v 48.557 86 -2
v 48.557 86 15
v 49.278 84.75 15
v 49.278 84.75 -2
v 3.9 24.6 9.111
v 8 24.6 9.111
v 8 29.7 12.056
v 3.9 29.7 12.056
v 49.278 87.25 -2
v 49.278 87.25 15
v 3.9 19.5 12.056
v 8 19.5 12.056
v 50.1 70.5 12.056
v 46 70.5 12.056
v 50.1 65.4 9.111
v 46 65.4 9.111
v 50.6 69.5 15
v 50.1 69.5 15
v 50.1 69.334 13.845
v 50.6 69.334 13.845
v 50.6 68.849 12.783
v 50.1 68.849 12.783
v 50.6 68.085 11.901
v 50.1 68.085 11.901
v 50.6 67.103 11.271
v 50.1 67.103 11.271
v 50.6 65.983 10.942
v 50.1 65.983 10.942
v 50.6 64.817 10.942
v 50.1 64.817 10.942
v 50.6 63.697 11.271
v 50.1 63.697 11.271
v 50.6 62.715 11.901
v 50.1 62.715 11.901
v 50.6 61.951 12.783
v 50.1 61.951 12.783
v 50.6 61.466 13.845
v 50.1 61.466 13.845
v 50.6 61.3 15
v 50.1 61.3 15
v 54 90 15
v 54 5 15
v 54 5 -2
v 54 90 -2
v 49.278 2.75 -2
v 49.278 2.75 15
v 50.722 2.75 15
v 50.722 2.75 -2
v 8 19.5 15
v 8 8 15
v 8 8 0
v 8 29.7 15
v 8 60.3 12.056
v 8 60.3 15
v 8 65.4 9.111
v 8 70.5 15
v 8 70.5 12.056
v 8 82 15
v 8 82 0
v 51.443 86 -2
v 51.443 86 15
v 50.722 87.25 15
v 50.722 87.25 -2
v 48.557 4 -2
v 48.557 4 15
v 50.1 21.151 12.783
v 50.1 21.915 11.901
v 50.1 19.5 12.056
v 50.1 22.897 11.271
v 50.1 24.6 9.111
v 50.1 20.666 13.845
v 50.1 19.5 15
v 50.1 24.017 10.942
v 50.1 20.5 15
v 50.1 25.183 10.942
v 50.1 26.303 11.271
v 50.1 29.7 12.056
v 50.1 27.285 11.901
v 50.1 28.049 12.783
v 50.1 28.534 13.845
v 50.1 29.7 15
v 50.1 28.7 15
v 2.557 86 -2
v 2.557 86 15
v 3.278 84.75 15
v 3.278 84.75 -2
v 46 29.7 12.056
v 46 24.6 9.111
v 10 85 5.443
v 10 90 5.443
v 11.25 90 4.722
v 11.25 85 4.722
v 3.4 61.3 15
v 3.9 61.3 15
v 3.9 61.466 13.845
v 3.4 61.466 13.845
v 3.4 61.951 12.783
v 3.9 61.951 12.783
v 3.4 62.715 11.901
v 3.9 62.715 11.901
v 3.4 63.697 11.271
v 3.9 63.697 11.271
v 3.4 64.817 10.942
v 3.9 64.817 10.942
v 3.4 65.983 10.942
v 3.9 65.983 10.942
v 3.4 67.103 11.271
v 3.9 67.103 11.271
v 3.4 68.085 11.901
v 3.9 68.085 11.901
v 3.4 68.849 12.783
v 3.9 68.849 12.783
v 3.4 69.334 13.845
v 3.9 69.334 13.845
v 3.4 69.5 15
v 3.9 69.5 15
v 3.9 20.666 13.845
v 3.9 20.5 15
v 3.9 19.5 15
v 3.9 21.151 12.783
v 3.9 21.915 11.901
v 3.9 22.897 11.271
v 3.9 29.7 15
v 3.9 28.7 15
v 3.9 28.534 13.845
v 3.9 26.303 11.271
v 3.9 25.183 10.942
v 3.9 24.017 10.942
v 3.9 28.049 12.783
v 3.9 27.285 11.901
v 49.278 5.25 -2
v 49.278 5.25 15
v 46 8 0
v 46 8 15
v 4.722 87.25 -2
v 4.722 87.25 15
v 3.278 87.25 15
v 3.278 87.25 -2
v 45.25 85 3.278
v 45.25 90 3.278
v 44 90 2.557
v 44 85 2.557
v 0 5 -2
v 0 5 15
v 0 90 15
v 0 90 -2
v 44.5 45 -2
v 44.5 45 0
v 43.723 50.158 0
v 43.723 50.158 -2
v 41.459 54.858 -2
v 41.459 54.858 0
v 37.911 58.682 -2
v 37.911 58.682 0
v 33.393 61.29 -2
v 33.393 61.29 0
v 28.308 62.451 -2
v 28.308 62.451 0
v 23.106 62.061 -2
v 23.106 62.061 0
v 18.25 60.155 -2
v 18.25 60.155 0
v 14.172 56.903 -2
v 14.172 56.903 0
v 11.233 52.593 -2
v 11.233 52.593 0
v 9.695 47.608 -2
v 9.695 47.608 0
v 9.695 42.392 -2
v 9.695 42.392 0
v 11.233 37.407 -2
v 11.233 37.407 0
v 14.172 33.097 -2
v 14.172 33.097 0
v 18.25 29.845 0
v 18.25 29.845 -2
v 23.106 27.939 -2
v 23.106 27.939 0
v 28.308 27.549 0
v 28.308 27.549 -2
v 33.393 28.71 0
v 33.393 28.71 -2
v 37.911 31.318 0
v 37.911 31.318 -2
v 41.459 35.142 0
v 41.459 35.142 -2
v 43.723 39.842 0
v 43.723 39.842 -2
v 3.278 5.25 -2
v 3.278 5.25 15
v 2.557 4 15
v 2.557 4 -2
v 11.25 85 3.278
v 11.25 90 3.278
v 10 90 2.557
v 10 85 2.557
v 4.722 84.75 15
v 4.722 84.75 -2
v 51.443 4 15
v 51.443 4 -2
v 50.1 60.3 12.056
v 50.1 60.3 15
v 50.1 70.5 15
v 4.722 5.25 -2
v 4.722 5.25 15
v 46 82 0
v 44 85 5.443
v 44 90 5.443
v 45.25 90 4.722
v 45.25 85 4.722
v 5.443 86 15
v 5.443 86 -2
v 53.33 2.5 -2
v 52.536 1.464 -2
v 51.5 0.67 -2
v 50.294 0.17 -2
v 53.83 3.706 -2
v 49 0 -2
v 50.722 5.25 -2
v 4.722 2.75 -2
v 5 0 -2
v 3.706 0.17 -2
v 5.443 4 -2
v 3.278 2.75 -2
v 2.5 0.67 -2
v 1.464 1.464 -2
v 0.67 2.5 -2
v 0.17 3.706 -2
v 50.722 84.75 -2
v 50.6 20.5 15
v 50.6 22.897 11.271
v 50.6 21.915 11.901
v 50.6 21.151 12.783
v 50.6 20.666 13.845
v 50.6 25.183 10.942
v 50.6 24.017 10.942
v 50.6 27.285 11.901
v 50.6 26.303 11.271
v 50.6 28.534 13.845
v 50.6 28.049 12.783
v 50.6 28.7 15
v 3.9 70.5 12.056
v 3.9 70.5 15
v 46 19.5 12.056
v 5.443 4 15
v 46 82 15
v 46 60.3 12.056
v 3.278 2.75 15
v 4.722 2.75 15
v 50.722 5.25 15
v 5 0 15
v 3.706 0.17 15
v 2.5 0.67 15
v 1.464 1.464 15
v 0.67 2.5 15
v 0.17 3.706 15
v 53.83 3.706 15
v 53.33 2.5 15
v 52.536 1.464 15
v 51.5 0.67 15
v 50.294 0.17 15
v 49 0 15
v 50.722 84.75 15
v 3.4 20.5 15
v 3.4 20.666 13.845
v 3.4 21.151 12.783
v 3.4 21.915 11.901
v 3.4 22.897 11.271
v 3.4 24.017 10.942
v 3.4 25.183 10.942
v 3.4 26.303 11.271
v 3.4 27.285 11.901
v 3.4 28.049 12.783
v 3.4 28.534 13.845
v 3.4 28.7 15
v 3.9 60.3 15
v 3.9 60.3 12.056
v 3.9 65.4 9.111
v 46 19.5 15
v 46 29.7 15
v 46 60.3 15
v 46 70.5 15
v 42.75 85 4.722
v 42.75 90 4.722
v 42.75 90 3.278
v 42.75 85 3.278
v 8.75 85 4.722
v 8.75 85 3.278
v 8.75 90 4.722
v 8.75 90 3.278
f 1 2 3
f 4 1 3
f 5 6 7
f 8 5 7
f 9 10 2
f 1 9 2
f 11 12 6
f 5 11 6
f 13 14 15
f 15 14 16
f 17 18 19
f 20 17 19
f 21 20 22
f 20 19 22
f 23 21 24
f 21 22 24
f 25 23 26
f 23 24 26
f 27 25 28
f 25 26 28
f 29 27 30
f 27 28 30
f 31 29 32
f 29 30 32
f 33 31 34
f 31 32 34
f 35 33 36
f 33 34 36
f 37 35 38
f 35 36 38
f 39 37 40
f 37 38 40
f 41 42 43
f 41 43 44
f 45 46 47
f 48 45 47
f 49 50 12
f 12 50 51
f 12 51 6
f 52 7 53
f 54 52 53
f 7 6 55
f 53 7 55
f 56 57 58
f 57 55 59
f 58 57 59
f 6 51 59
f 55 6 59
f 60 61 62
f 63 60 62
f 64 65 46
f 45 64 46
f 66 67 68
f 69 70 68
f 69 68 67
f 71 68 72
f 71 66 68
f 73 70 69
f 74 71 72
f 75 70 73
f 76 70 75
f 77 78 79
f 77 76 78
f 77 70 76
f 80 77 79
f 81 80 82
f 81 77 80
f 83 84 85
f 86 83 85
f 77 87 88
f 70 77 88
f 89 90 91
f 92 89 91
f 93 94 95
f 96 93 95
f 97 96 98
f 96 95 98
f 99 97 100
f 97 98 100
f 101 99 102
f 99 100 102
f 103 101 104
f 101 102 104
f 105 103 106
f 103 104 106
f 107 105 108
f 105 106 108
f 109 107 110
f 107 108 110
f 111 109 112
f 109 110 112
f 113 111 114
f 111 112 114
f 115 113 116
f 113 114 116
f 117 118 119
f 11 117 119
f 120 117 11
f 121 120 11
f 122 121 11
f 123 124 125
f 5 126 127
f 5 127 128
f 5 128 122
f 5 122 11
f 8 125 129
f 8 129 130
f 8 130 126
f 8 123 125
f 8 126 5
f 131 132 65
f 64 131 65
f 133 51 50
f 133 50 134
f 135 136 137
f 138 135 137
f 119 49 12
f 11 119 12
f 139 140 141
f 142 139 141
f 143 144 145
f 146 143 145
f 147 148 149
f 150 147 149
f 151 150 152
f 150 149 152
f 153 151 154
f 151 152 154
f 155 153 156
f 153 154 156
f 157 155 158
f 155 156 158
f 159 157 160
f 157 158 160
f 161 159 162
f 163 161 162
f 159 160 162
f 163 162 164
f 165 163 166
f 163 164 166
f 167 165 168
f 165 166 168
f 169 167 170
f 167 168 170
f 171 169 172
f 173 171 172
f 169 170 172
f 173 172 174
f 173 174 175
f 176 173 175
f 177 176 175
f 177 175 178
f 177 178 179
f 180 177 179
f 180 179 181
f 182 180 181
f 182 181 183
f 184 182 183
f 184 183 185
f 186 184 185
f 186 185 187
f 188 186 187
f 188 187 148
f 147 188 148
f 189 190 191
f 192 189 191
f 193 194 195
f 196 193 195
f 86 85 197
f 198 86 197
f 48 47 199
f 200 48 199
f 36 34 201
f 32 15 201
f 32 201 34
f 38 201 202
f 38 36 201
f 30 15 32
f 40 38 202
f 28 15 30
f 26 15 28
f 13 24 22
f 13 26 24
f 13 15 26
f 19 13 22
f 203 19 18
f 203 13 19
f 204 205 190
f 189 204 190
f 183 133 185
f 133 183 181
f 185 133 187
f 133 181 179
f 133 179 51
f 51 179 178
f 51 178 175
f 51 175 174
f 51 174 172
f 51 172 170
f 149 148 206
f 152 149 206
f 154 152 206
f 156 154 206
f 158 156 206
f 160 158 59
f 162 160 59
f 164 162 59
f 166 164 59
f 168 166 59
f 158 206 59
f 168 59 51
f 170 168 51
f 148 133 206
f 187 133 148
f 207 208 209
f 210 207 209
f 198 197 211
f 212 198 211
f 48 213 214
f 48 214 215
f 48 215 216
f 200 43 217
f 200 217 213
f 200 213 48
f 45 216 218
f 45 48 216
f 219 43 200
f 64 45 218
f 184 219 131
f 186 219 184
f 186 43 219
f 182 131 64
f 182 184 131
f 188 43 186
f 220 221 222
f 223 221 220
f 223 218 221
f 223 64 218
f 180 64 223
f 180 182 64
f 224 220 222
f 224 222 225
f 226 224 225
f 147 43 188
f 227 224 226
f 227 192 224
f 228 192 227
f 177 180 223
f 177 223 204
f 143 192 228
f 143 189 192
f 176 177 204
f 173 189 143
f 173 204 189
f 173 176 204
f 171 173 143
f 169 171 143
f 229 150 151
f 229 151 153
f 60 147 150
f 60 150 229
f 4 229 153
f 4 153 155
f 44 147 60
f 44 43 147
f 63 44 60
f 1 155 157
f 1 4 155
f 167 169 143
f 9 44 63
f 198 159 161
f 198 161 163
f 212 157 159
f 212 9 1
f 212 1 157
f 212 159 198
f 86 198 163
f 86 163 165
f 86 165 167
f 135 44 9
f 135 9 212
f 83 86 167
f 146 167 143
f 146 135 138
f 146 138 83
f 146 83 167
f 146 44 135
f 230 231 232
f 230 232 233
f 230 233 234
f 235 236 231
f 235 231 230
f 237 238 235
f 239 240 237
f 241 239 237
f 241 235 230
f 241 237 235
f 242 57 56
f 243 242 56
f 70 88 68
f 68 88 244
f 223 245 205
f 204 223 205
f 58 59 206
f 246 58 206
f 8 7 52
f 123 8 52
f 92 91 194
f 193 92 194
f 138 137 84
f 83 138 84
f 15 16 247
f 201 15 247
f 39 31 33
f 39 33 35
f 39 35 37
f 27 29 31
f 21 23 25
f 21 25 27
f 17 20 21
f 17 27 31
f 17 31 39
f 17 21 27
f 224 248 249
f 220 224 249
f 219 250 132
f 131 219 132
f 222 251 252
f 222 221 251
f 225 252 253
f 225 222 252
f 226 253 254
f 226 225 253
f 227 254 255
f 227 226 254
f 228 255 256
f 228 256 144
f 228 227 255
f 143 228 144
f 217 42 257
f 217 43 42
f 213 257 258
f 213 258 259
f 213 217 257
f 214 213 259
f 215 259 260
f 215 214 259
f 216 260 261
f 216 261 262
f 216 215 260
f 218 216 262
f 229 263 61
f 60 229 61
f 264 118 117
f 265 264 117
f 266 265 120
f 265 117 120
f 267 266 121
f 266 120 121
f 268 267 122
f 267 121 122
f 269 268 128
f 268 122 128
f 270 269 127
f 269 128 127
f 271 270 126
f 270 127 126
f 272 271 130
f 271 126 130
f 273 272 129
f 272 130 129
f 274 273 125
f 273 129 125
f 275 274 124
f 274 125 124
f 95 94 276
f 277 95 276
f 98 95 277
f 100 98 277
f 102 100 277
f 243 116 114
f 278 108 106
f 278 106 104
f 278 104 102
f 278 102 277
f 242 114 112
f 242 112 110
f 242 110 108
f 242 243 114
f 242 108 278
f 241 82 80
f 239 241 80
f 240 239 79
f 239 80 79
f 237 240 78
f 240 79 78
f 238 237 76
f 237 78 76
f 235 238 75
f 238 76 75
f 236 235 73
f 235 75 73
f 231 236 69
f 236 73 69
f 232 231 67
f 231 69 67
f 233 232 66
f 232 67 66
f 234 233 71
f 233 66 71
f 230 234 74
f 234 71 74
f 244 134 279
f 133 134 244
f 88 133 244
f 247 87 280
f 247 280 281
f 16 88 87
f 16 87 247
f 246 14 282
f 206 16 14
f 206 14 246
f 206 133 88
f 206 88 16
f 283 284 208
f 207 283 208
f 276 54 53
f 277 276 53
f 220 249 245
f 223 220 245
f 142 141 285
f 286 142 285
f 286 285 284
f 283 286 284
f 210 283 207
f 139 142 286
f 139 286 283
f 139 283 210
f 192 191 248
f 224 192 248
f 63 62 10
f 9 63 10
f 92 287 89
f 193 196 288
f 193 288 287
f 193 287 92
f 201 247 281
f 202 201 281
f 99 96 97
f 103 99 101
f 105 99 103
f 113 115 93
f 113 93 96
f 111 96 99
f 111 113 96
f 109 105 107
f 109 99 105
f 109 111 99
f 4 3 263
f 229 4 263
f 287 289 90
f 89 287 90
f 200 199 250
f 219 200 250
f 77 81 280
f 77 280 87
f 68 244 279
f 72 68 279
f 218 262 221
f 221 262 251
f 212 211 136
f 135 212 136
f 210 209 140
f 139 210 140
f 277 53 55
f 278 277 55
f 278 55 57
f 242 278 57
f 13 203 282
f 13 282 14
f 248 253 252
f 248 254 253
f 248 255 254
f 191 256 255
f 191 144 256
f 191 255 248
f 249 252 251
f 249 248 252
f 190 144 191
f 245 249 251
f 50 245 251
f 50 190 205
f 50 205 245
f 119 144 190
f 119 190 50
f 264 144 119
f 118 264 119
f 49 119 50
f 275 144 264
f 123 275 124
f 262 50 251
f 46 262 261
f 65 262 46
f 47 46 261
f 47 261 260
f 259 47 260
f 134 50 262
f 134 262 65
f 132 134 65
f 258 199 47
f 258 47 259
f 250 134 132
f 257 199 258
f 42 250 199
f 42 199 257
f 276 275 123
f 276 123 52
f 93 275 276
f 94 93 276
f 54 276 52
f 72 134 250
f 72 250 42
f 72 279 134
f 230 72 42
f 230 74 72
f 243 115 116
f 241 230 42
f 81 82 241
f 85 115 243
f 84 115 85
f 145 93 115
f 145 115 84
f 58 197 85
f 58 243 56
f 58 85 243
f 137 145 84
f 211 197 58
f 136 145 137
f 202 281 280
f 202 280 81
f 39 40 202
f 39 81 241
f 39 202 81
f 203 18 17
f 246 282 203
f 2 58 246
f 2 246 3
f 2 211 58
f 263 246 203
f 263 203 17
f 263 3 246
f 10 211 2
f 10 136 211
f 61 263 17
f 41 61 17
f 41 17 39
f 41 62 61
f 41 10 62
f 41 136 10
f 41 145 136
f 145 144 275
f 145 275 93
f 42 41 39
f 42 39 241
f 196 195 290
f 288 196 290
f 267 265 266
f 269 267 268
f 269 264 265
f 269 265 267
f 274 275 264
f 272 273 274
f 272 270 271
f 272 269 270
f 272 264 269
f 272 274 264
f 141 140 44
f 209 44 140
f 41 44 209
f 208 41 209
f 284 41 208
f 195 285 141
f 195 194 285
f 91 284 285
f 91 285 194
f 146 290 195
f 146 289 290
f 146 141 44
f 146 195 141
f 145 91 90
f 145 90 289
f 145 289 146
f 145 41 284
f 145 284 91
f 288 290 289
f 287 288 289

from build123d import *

# Parameters (mm, degrees)
SKETCH1_W           = 54
SKETCH1_H           = 90
SKETCH1_W_2         = 38
SKETCH1_H_2         = 74
BOSS_EXTRUDE1_DEPTH = 30
CUT_EXTRUDE1_DEPTH  = 4.1
SKETCH5_R           = 4.1
CUT_EXTRUDE2_DEPTH  = 0.5
CUT_EXTRUDE3_DEPTH  = 4.1
SKETCH7_R           = 4.1
CUT_EXTRUDE4_DEPTH  = 0.5
SKETCH8_W           = 54
SKETCH8_H           = 90
BOSS_EXTRUDE2_DEPTH = 2
SKETCH9_W           = 54
SKETCH9_H           = 90
BOSS_EXTRUDE3_DEPTH = 2
SKETCH10_W          = 54
SKETCH10_H          = 90
CUT_EXTRUDE5_DEPTH  = 17
SKETCH11_R          = 17.5
CUT_EXTRUDE6_DEPTH  = 3
CUT_EXTRUDE7_DEPTH  = 18
CUT_EXTRUDE8_DEPTH  = 5
FILLET1_R           = 5


with BuildPart() as part:
    # Sketch1 → Boss-Extrude1 (new body)
    with BuildSketch(Plane.XY):
        with Locations((27, 45)):
            Rectangle(SKETCH1_W, SKETCH1_H)
        with Locations((27, 45)):
            Rectangle(SKETCH1_W_2, SKETCH1_H_2, mode=Mode.SUBTRACT)
    extrude(amount=BOSS_EXTRUDE1_DEPTH)

    # Sketch2 → Cut-Extrude1 (cut)
    with BuildSketch(Plane.ZY.offset(-46)):
        Polygon((20.888972746, 65.4), (17.944486373, 70.5), (12.055513627, 70.5), (9.111027254, 65.4), (12.055513627, 60.3), (17.944486373, 60.3), align=None)
        Polygon((20.888972746, 24.6), (17.944486373, 29.7), (12.055513627, 29.7), (9.111027254, 24.6), (12.055513627, 19.5), (17.944486373, 19.5), align=None)
    extrude(amount=-CUT_EXTRUDE1_DEPTH, mode=Mode.SUBTRACT)

    # Sketch5 → Cut-Extrude2 (cut)
    with BuildSketch(Plane.ZY.offset(-50.1)):
        with Locations((15, 65.4)):
            Circle(SKETCH5_R)
        with Locations((15, 24.6)):
            Circle(SKETCH5_R)
    extrude(amount=-CUT_EXTRUDE2_DEPTH, mode=Mode.SUBTRACT)

    # Sketch6 → Cut-Extrude3 (cut)
    with BuildSketch(Plane(origin=(8, 0, 0), x_dir=(0, 0, -1), z_dir=(1, 0, 0))):
        Polygon((-9.111027254, 65.4), (-12.055513627, 70.5), (-17.944486373, 70.5), (-20.888972746, 65.4), (-17.944486373, 60.3), (-12.055513627, 60.3), align=None)
        Polygon((-9.111027254, 24.6), (-12.055513627, 29.7), (-17.944486373, 29.7), (-20.888972746, 24.6), (-17.944486373, 19.5), (-12.055513627, 19.5), align=None)
    extrude(amount=-CUT_EXTRUDE3_DEPTH, mode=Mode.SUBTRACT)

    # Sketch7 → Cut-Extrude4 (cut)
    with BuildSketch(Plane(origin=(3.9, 0, 0), x_dir=(0, 0, -1), z_dir=(1, 0, 0))):
        with Locations((-15, 65.4)):
            Circle(SKETCH7_R)
        with Locations((-15, 24.6)):
            Circle(SKETCH7_R)
    extrude(amount=-CUT_EXTRUDE4_DEPTH, mode=Mode.SUBTRACT)

    # Sketch8 → Boss-Extrude2 (add)
    with BuildSketch(Plane.XY.offset(30)):
        with Locations((27, 45)):
            Rectangle(SKETCH8_W, SKETCH8_H)
    extrude(amount=BOSS_EXTRUDE2_DEPTH)

    # Sketch9 → Boss-Extrude3 (add)
    with BuildSketch(Plane(origin=(0, 0, 0), x_dir=(-1, 0, 0), z_dir=(0, 0, -1))):
        with Locations((-27, 45)):
            Rectangle(SKETCH9_W, SKETCH9_H)
    extrude(amount=BOSS_EXTRUDE3_DEPTH)

    # Sketch10 → Cut-Extrude5 (cut)
    with BuildSketch(Plane.XY.offset(32)):
        with Locations((27, 45)):
            Rectangle(SKETCH10_W, SKETCH10_H)
    extrude(amount=-CUT_EXTRUDE5_DEPTH, mode=Mode.SUBTRACT)

    # Sketch11 → Cut-Extrude6 (cut, through all)
    with BuildSketch(Plane.XY):
        with Locations((27, 45)):
            Circle(SKETCH11_R)
    extrude(amount=-CUT_EXTRUDE6_DEPTH, mode=Mode.SUBTRACT)

    # Sketch12 → Cut-Extrude7 (cut, through all)
    with BuildSketch(Plane.XY.offset(15)):
        Polygon((5.443375673, 86), (4.721687836, 87.25), (3.278312164, 87.25), (2.556624327, 86), (3.278312164, 84.75), (4.721687836, 84.75), align=None)
        Polygon((51.443375673, 86), (50.721687836, 87.25), (49.278312164, 87.25), (48.556624327, 86), (49.278312164, 84.75), (50.721687836, 84.75), align=None)
        Polygon((3.278312164, 2.75), (4.721687836, 2.75), (5.443375673, 4), (4.721687836, 5.25), (3.278312164, 5.25), (2.556624327, 4), align=None)
        Polygon((50.721687836, 5.25), (49.278312164, 5.25), (48.556624327, 4), (49.278312164, 2.75), (50.721687836, 2.75), (51.443375673, 4), align=None)
    extrude(amount=-CUT_EXTRUDE7_DEPTH, mode=Mode.SUBTRACT)

    # Sketch13 → Cut-Extrude8 (cut)
    with BuildSketch(Plane(origin=(0, 90, 0), x_dir=(1, 0, 0), z_dir=(0, 1, 0))):
        Polygon((10, -2.556624327), (8.75, -3.278312164), (8.75, -4.721687836), (10, -5.443375673), (11.25, -4.721687836), (11.25, -3.278312164), align=None)
        Polygon((44, -2.556624327), (42.75, -3.278312164), (42.75, -4.721687836), (44, -5.443375673), (45.25, -4.721687836), (45.25, -3.278312164), align=None)
    extrude(amount=-CUT_EXTRUDE8_DEPTH, mode=Mode.SUBTRACT)

    # Fillet1
    fillet1_edges = [part.edges().sort_by_distance(p)[0] for p in [
        (0, 0, 6.5),
        (54, 0, 6.5),
    ]]
    fillet(fillet1_edges, radius=FILLET1_R)


solid = part.part
